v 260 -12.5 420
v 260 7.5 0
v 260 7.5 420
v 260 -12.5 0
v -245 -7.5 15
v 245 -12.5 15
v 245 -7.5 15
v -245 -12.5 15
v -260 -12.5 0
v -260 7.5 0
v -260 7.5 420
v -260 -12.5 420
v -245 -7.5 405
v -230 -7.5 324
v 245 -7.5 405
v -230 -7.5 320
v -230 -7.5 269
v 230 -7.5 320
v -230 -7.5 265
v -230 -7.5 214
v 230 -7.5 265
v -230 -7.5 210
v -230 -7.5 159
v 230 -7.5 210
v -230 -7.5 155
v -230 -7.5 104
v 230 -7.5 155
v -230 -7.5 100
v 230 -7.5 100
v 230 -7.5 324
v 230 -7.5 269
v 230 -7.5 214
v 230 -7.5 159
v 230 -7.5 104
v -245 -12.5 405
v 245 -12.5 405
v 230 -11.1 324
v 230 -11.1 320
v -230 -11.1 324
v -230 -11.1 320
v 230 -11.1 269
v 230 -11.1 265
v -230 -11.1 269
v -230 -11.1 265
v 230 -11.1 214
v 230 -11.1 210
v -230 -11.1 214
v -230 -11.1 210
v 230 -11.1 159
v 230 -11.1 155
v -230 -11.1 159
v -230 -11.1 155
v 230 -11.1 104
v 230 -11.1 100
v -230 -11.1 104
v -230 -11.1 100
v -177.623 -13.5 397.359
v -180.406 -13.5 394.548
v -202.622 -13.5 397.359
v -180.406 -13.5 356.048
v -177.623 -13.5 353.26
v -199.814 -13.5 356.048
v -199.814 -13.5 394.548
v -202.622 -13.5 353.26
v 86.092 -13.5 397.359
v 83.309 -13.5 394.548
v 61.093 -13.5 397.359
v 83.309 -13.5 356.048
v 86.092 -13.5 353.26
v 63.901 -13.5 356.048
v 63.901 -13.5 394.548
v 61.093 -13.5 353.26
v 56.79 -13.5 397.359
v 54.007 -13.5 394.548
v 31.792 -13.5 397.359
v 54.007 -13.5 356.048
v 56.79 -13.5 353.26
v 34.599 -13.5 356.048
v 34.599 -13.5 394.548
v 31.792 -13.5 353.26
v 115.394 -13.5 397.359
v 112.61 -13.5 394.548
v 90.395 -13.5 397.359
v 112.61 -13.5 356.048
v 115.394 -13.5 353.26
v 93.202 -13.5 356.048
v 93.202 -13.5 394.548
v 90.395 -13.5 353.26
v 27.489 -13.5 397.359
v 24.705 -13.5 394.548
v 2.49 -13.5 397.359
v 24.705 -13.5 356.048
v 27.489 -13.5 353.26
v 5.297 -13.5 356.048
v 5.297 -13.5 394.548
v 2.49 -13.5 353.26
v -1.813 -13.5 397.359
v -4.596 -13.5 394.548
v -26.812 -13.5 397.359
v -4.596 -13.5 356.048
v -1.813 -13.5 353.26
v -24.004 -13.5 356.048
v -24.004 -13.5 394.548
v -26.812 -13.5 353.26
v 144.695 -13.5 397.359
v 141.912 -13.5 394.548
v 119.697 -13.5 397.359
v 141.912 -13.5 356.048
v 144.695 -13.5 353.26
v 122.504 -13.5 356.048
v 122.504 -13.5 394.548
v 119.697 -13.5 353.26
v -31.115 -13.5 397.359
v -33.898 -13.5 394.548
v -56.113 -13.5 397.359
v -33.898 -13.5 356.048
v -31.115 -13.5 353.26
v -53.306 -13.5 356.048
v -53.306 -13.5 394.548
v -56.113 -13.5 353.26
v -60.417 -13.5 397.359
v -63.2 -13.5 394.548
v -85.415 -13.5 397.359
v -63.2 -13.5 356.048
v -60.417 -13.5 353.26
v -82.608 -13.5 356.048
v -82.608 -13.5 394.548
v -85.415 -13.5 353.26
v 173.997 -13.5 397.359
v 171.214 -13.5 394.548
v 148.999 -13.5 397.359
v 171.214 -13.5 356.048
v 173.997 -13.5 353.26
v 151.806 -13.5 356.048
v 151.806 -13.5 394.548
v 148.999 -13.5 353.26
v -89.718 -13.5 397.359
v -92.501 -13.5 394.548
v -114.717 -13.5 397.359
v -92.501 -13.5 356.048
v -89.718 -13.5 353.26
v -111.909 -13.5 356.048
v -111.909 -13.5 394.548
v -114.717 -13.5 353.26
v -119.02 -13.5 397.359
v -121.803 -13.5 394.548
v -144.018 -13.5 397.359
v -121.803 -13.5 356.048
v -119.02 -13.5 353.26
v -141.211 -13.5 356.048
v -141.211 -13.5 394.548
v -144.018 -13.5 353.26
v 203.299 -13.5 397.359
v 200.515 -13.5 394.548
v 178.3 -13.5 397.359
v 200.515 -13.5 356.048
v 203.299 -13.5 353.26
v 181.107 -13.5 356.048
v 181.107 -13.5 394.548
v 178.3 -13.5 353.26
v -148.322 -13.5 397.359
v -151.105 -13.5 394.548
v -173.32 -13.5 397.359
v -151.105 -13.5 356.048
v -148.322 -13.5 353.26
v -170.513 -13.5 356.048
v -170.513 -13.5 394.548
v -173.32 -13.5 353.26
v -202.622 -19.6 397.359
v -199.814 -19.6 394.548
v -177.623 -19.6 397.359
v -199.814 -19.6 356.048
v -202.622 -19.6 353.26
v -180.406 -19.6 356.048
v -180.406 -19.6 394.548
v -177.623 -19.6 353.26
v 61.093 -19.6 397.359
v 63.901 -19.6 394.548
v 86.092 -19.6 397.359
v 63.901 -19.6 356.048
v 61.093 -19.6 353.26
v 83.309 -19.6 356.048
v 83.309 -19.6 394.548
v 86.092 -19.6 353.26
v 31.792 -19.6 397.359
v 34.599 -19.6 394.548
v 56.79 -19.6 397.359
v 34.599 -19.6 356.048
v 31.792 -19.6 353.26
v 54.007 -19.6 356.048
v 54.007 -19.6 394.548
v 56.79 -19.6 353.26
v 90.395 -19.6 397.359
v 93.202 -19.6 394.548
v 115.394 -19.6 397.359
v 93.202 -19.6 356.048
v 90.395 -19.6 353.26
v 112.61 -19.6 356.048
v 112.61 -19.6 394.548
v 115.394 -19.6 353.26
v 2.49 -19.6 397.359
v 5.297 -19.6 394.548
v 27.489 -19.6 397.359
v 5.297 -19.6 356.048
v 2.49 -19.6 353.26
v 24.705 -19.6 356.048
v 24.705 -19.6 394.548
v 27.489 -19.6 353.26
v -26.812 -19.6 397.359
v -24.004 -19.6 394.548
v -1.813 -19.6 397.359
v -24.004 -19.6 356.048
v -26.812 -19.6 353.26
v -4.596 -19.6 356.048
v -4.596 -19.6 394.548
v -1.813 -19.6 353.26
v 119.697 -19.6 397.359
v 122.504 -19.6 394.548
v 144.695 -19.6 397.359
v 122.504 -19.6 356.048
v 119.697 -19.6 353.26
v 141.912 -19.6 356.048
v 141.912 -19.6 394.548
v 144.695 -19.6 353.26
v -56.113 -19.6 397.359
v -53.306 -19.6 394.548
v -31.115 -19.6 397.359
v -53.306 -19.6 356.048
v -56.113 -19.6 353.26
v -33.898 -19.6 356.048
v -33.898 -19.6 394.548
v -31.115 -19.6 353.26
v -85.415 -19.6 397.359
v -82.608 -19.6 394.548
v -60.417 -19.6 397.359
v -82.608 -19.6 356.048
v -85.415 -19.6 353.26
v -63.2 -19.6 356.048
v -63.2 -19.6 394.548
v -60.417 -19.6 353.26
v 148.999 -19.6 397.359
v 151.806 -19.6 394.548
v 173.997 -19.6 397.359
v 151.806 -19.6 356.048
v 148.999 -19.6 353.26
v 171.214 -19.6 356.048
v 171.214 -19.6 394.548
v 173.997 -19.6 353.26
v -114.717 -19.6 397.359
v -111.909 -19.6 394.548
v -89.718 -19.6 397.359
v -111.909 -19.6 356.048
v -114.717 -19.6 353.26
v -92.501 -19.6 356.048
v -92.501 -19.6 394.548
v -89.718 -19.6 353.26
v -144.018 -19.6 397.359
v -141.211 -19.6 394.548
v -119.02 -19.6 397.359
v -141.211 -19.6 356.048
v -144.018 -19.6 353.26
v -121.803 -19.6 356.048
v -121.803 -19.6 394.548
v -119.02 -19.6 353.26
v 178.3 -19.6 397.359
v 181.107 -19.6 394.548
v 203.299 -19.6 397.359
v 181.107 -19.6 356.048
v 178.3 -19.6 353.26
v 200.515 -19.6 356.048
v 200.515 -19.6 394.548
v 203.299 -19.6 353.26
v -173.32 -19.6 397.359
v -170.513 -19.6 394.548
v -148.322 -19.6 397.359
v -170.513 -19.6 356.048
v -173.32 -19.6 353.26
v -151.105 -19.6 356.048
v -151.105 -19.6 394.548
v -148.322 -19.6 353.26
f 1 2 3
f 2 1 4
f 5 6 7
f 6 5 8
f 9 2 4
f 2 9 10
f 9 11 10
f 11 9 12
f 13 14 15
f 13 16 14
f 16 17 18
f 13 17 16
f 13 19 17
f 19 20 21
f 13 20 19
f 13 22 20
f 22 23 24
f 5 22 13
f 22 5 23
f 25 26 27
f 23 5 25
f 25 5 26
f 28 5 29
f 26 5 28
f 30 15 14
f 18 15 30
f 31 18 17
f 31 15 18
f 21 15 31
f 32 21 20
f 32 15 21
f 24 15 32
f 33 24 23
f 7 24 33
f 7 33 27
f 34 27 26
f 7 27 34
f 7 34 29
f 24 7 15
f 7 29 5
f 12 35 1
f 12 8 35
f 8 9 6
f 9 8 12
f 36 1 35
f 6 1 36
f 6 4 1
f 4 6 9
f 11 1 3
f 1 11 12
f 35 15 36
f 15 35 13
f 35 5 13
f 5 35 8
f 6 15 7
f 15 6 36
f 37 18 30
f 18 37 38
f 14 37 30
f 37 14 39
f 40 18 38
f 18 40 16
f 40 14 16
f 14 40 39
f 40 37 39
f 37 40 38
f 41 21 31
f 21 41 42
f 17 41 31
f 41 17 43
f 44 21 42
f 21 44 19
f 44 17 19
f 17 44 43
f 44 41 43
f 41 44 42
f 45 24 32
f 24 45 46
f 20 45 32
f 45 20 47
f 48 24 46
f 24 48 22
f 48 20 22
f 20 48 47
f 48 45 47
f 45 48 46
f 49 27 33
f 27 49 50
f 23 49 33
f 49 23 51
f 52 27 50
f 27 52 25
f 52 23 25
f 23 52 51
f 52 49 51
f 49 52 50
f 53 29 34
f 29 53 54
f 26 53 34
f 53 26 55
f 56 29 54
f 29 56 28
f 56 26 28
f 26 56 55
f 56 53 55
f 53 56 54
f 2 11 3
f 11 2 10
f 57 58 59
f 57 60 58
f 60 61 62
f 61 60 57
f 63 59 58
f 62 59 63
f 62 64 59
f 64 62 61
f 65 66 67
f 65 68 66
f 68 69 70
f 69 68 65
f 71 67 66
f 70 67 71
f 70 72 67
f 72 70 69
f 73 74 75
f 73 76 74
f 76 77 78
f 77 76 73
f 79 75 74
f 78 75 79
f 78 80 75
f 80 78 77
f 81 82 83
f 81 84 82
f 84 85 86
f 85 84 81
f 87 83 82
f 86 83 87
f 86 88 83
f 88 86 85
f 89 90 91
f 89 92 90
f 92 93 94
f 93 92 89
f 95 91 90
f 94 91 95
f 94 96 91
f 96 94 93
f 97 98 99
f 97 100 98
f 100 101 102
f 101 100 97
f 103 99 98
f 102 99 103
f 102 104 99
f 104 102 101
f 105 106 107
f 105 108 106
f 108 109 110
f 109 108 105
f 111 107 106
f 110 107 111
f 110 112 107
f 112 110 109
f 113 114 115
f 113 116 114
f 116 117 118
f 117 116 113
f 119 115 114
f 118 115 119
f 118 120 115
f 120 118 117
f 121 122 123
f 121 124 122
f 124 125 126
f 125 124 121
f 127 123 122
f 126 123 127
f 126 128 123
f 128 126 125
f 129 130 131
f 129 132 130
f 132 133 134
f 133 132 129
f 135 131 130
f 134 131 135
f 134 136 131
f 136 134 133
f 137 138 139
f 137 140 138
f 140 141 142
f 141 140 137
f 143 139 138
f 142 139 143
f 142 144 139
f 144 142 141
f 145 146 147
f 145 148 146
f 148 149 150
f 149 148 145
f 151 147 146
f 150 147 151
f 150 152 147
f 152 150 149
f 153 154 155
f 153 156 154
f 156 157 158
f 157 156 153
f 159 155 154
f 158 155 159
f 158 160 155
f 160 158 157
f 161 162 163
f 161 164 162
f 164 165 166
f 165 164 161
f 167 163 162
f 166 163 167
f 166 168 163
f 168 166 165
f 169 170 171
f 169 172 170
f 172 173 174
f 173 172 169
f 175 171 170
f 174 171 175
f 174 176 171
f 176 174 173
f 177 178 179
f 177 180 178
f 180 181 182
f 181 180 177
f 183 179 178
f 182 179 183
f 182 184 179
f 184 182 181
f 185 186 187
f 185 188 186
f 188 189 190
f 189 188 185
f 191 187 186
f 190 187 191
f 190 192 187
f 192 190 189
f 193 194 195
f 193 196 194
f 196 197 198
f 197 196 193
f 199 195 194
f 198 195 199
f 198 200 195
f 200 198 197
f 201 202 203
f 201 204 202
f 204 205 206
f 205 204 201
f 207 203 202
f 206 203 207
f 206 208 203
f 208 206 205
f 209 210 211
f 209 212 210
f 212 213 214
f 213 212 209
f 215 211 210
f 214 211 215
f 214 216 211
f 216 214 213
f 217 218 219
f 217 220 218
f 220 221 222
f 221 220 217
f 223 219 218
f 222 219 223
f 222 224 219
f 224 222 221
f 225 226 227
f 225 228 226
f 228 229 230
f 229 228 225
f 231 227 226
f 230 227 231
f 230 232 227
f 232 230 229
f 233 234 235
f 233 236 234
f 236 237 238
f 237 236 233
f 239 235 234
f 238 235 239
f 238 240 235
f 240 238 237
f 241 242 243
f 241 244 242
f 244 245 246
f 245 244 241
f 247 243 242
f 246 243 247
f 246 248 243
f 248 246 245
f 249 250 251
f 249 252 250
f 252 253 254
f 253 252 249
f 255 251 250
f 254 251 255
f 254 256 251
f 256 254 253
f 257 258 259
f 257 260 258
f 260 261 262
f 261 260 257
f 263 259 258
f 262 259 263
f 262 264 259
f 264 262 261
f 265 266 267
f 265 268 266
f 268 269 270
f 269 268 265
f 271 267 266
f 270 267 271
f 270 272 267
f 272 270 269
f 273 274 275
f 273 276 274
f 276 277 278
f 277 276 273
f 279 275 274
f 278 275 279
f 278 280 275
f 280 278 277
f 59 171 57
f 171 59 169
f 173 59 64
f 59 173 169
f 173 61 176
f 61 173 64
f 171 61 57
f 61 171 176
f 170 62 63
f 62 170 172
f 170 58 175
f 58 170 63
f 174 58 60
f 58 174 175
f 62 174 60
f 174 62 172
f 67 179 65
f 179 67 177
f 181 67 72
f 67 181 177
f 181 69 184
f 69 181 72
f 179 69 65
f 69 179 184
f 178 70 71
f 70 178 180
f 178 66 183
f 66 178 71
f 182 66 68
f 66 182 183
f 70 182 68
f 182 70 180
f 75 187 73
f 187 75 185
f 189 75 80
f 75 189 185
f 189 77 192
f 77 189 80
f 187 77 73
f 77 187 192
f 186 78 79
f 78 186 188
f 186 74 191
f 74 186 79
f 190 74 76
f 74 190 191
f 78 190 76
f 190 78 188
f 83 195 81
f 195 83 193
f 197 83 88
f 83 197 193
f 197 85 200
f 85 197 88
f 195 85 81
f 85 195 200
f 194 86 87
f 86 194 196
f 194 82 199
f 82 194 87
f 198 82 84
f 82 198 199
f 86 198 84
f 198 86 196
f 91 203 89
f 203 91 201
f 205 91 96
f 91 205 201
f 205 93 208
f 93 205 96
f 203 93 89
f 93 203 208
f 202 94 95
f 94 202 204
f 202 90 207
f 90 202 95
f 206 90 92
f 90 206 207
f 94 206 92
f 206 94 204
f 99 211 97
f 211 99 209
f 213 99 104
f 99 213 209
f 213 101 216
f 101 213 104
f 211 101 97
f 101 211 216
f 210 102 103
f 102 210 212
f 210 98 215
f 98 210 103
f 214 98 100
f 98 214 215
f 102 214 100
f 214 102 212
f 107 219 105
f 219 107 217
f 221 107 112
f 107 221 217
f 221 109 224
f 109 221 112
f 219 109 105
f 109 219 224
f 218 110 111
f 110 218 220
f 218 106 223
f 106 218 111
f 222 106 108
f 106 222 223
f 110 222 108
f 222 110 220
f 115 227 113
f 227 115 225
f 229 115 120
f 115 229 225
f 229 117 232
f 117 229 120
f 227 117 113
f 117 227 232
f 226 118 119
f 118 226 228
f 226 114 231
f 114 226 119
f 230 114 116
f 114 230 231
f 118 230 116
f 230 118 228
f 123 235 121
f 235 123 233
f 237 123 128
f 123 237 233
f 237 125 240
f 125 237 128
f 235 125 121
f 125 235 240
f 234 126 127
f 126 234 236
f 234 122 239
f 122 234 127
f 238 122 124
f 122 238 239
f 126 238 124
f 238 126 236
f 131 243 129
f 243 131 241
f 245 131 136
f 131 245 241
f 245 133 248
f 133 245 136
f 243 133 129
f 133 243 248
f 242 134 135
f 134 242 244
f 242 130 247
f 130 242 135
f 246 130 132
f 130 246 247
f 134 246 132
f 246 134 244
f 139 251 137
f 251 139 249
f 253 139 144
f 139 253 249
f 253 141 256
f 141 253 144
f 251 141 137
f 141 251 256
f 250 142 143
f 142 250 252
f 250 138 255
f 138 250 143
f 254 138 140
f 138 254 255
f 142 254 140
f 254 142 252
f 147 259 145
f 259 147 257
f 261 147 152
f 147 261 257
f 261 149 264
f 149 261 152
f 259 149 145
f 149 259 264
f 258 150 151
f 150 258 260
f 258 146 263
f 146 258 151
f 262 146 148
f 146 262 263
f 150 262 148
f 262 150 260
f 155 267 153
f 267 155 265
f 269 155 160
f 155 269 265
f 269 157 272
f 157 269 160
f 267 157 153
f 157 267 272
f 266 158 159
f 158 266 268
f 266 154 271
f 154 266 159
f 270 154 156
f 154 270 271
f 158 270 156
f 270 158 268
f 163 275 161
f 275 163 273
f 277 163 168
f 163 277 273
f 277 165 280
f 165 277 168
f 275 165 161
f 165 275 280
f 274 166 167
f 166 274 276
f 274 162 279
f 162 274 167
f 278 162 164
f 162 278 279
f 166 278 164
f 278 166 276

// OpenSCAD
// file: tea_shop_signage_parameters.scad
// =============================================================================
// TEA SHOP DIORAMA — SIGNAGE PARAMETERS (3D TAMIL "டீ கடை")
// =============================================================================
// All units: mm (1000 mm = 1.0 m), 1:1 real-world scale (1000 units = 1 GTA unit).
// Shared global coordinate system (identical to Groups 1–4):
//   +X -> left -> right  (0 = left outer wall, BUILD_W = right outer wall)
//   +Y -> front -> back  (0 = front eave wall, BUILD_D = back wall)
//   +Z -> up             (0 = ground / plinth top datum)
// =============================================================================

// --- SHARED GLOBAL VARIABLES (Reused from Groups 1–4) ------------------------
WALL_T             = 250;   // wall panel thickness
BUILD_W            = 6000;  // building width along X (6.00 m)
BUILD_D            = 4000;  // building depth along Y (4.00 m)
BACK_H             = 3200;  // wall height at BACK (tall side)
FRONT_H            = 2400;  // wall height at FRONT eave (short side)

// Group 1 front opening & plinth references:
left_pier_width    = 600;
window_width       = 3400;
mid_pier_width     = 500;
door_width         = 1000;
sill_height        = 900;

window_left        = left_pier_width;                   // 600 mm
window_right       = window_left + window_width;        // 4000 mm
door_left          = window_right + mid_pier_width;     // 4500 mm
door_right         = door_left + door_width;            // 5500 mm

// Group 2/3 roof slope derivation:
ROOF_RISE          = BACK_H - FRONT_H;                 // 800 mm
ROOF_RUN           = BUILD_D;                           // 4000 mm
ROOF_ANGLE         = atan(ROOF_RISE / ROOF_RUN);        // ~11.3099°

// Group 3 pergola structure references:
POST_SIZE          = 100;
POST_Y             = -2250;                             // front post line (mm)
MAIN_BEAM_WIDTH    = 80;
MAIN_BEAM_HEIGHT   = 120;
CROSS_BEAM_WIDTH   = 80;
CROSS_BEAM_HEIGHT  = 100;
PERGOLA_EAVE_Z     = FRONT_H;
POST_HEIGHT        = PERGOLA_EAVE_Z - abs(POST_Y) * tan(ROOF_ANGLE) - CROSS_BEAM_HEIGHT - MAIN_BEAM_HEIGHT;


// =============================================================================
// SIGNAGE PARAMETERS — ACCURATE SCALE & FACADE POSITIONING
// =============================================================================

// --- 1. Main Hanging Signboard ("டீ கடை") --------------------------------------
// REFERENCE OBSERVATIONS (Images 9b1fed6bc4, 0d34e93fe1, 9cc7378ff7):
// - Positioned centered directly on the front facade: X = BUILD_W / 2 = 3000 mm.
// - Dimensions: 1600 mm wide x 920 mm high, 30 mm thick base plate.
// - Raised outer protective rim border (25 mm wide, 8 mm projection).
// - 3D Tamil typography: "டீ கடை" (Tea Kadai) extruded in bold 3D letters.
// - Decorative separator line + authentic 3D tea cup graphic on right side.
// - Bottom edge rests directly on top of the front pergola canopy / beam line.
HANGING_SIGN_W     = 1600;  // signboard width along X (mm)
HANGING_SIGN_H     = 920;   // signboard height along Z (mm)
HANGING_SIGN_T     = 30;    // board base plate thickness along Y (mm)
HANGING_SIGN_RIM_W = 25;    // width of outer raised border frame (mm)
HANGING_SIGN_RIM_T = 8;     // projection of outer border frame (mm)
HANGING_SIGN_LET_T = 10;    // extrusion depth of 3D Tamil text & graphics (mm)

HANGING_SIGN_X     = BUILD_W / 2; // Centered at X = 3000 mm on front facade
HANGING_SIGN_Y     = POST_Y - MAIN_BEAM_WIDTH / 2 - HANGING_SIGN_T; // sitting on front face of beam
// Elevation: bottom rests flush on top of the pergola canopy eave line:
HANGING_SIGN_Z     = PERGOLA_EAVE_Z - abs(POST_Y) * tan(ROOF_ANGLE) + 10; // ≈ 1960 mm


// --- 2. Sign Bracket / Mounting Framework ------------------------------------
// Timber framework supporting the sign from behind, anchoring it to the pergola:
BRACKET_POST_W     = 90;    // upright support timber width along X (mm)
BRACKET_POST_D     = 80;    // upright support timber depth along Y (mm)
BRACKET_POST_TOP_Z = HANGING_SIGN_Z + HANGING_SIGN_H;
BRACKET_POST_H     = BRACKET_POST_TOP_Z - (POST_HEIGHT + MAIN_BEAM_HEIGHT);

BRACKET_BATTEN_W   = HANGING_SIGN_W - 120; // rear cross-batten width along X (mm)
BRACKET_BATTEN_D   = 45;                   // rear cross-batten depth along Y (mm)
BRACKET_BATTEN_H   = 55;                   // rear cross-batten height along Z (mm)


// --- 3. Front Wall Price List Sign ("விலைப்பட்டியல்") ------------------------
// REFERENCE OBSERVATIONS (Images 9b1fed6bc4, 8ffafd36e4):
// - Mounted flat on the exterior front knee-wall sill, beneath the service window.
// - Dimensions: 520 mm wide x 420 mm high x 15 mm thick.
// - Outer frame rim (15 mm wide) + 3D Tamil header "விலைப்பட்டியல்" (Price List).
PRICE_SIGN_W       = 520;   // width along X (mm)
PRICE_SIGN_H       = 420;   // height along Z (mm)
PRICE_SIGN_T       = 15;    // thickness along Y (mm)
PRICE_SIGN_RIM_W   = 15;    // border rim width (mm)
PRICE_SIGN_RIM_T   = 5;     // border rim thickness (mm)
PRICE_SIGN_LET_T   = 6;     // text/lines extrusion depth (mm)

PRICE_SIGN_X       = window_left + 450; // X = 1050 mm
PRICE_SIGN_Y       = -PRICE_SIGN_T - 2; // 2 mm proud of front wall (prevents z-fighting)
PRICE_SIGN_Z       = 350;               // centered vertically on the 900mm sill
// main file
// =============================================================================
// part_price_list_sign.scad — Export the 3D Tamil "விலைப்பட்டியல்" menu board.
// =============================================================================
// Centered at local origin [0, 0, 0] for direct Blender import!
// Spawns right at the 3D cursor / viewport center in Blender.
// Press F6 (render), then File -> Export as OBJ (or STL).
// =============================================================================

include <tea_shop_signage_modules.scad>;

// world_pos = false centers the model at local origin [0, 0, 0]
price_list_sign(world_pos = false);
